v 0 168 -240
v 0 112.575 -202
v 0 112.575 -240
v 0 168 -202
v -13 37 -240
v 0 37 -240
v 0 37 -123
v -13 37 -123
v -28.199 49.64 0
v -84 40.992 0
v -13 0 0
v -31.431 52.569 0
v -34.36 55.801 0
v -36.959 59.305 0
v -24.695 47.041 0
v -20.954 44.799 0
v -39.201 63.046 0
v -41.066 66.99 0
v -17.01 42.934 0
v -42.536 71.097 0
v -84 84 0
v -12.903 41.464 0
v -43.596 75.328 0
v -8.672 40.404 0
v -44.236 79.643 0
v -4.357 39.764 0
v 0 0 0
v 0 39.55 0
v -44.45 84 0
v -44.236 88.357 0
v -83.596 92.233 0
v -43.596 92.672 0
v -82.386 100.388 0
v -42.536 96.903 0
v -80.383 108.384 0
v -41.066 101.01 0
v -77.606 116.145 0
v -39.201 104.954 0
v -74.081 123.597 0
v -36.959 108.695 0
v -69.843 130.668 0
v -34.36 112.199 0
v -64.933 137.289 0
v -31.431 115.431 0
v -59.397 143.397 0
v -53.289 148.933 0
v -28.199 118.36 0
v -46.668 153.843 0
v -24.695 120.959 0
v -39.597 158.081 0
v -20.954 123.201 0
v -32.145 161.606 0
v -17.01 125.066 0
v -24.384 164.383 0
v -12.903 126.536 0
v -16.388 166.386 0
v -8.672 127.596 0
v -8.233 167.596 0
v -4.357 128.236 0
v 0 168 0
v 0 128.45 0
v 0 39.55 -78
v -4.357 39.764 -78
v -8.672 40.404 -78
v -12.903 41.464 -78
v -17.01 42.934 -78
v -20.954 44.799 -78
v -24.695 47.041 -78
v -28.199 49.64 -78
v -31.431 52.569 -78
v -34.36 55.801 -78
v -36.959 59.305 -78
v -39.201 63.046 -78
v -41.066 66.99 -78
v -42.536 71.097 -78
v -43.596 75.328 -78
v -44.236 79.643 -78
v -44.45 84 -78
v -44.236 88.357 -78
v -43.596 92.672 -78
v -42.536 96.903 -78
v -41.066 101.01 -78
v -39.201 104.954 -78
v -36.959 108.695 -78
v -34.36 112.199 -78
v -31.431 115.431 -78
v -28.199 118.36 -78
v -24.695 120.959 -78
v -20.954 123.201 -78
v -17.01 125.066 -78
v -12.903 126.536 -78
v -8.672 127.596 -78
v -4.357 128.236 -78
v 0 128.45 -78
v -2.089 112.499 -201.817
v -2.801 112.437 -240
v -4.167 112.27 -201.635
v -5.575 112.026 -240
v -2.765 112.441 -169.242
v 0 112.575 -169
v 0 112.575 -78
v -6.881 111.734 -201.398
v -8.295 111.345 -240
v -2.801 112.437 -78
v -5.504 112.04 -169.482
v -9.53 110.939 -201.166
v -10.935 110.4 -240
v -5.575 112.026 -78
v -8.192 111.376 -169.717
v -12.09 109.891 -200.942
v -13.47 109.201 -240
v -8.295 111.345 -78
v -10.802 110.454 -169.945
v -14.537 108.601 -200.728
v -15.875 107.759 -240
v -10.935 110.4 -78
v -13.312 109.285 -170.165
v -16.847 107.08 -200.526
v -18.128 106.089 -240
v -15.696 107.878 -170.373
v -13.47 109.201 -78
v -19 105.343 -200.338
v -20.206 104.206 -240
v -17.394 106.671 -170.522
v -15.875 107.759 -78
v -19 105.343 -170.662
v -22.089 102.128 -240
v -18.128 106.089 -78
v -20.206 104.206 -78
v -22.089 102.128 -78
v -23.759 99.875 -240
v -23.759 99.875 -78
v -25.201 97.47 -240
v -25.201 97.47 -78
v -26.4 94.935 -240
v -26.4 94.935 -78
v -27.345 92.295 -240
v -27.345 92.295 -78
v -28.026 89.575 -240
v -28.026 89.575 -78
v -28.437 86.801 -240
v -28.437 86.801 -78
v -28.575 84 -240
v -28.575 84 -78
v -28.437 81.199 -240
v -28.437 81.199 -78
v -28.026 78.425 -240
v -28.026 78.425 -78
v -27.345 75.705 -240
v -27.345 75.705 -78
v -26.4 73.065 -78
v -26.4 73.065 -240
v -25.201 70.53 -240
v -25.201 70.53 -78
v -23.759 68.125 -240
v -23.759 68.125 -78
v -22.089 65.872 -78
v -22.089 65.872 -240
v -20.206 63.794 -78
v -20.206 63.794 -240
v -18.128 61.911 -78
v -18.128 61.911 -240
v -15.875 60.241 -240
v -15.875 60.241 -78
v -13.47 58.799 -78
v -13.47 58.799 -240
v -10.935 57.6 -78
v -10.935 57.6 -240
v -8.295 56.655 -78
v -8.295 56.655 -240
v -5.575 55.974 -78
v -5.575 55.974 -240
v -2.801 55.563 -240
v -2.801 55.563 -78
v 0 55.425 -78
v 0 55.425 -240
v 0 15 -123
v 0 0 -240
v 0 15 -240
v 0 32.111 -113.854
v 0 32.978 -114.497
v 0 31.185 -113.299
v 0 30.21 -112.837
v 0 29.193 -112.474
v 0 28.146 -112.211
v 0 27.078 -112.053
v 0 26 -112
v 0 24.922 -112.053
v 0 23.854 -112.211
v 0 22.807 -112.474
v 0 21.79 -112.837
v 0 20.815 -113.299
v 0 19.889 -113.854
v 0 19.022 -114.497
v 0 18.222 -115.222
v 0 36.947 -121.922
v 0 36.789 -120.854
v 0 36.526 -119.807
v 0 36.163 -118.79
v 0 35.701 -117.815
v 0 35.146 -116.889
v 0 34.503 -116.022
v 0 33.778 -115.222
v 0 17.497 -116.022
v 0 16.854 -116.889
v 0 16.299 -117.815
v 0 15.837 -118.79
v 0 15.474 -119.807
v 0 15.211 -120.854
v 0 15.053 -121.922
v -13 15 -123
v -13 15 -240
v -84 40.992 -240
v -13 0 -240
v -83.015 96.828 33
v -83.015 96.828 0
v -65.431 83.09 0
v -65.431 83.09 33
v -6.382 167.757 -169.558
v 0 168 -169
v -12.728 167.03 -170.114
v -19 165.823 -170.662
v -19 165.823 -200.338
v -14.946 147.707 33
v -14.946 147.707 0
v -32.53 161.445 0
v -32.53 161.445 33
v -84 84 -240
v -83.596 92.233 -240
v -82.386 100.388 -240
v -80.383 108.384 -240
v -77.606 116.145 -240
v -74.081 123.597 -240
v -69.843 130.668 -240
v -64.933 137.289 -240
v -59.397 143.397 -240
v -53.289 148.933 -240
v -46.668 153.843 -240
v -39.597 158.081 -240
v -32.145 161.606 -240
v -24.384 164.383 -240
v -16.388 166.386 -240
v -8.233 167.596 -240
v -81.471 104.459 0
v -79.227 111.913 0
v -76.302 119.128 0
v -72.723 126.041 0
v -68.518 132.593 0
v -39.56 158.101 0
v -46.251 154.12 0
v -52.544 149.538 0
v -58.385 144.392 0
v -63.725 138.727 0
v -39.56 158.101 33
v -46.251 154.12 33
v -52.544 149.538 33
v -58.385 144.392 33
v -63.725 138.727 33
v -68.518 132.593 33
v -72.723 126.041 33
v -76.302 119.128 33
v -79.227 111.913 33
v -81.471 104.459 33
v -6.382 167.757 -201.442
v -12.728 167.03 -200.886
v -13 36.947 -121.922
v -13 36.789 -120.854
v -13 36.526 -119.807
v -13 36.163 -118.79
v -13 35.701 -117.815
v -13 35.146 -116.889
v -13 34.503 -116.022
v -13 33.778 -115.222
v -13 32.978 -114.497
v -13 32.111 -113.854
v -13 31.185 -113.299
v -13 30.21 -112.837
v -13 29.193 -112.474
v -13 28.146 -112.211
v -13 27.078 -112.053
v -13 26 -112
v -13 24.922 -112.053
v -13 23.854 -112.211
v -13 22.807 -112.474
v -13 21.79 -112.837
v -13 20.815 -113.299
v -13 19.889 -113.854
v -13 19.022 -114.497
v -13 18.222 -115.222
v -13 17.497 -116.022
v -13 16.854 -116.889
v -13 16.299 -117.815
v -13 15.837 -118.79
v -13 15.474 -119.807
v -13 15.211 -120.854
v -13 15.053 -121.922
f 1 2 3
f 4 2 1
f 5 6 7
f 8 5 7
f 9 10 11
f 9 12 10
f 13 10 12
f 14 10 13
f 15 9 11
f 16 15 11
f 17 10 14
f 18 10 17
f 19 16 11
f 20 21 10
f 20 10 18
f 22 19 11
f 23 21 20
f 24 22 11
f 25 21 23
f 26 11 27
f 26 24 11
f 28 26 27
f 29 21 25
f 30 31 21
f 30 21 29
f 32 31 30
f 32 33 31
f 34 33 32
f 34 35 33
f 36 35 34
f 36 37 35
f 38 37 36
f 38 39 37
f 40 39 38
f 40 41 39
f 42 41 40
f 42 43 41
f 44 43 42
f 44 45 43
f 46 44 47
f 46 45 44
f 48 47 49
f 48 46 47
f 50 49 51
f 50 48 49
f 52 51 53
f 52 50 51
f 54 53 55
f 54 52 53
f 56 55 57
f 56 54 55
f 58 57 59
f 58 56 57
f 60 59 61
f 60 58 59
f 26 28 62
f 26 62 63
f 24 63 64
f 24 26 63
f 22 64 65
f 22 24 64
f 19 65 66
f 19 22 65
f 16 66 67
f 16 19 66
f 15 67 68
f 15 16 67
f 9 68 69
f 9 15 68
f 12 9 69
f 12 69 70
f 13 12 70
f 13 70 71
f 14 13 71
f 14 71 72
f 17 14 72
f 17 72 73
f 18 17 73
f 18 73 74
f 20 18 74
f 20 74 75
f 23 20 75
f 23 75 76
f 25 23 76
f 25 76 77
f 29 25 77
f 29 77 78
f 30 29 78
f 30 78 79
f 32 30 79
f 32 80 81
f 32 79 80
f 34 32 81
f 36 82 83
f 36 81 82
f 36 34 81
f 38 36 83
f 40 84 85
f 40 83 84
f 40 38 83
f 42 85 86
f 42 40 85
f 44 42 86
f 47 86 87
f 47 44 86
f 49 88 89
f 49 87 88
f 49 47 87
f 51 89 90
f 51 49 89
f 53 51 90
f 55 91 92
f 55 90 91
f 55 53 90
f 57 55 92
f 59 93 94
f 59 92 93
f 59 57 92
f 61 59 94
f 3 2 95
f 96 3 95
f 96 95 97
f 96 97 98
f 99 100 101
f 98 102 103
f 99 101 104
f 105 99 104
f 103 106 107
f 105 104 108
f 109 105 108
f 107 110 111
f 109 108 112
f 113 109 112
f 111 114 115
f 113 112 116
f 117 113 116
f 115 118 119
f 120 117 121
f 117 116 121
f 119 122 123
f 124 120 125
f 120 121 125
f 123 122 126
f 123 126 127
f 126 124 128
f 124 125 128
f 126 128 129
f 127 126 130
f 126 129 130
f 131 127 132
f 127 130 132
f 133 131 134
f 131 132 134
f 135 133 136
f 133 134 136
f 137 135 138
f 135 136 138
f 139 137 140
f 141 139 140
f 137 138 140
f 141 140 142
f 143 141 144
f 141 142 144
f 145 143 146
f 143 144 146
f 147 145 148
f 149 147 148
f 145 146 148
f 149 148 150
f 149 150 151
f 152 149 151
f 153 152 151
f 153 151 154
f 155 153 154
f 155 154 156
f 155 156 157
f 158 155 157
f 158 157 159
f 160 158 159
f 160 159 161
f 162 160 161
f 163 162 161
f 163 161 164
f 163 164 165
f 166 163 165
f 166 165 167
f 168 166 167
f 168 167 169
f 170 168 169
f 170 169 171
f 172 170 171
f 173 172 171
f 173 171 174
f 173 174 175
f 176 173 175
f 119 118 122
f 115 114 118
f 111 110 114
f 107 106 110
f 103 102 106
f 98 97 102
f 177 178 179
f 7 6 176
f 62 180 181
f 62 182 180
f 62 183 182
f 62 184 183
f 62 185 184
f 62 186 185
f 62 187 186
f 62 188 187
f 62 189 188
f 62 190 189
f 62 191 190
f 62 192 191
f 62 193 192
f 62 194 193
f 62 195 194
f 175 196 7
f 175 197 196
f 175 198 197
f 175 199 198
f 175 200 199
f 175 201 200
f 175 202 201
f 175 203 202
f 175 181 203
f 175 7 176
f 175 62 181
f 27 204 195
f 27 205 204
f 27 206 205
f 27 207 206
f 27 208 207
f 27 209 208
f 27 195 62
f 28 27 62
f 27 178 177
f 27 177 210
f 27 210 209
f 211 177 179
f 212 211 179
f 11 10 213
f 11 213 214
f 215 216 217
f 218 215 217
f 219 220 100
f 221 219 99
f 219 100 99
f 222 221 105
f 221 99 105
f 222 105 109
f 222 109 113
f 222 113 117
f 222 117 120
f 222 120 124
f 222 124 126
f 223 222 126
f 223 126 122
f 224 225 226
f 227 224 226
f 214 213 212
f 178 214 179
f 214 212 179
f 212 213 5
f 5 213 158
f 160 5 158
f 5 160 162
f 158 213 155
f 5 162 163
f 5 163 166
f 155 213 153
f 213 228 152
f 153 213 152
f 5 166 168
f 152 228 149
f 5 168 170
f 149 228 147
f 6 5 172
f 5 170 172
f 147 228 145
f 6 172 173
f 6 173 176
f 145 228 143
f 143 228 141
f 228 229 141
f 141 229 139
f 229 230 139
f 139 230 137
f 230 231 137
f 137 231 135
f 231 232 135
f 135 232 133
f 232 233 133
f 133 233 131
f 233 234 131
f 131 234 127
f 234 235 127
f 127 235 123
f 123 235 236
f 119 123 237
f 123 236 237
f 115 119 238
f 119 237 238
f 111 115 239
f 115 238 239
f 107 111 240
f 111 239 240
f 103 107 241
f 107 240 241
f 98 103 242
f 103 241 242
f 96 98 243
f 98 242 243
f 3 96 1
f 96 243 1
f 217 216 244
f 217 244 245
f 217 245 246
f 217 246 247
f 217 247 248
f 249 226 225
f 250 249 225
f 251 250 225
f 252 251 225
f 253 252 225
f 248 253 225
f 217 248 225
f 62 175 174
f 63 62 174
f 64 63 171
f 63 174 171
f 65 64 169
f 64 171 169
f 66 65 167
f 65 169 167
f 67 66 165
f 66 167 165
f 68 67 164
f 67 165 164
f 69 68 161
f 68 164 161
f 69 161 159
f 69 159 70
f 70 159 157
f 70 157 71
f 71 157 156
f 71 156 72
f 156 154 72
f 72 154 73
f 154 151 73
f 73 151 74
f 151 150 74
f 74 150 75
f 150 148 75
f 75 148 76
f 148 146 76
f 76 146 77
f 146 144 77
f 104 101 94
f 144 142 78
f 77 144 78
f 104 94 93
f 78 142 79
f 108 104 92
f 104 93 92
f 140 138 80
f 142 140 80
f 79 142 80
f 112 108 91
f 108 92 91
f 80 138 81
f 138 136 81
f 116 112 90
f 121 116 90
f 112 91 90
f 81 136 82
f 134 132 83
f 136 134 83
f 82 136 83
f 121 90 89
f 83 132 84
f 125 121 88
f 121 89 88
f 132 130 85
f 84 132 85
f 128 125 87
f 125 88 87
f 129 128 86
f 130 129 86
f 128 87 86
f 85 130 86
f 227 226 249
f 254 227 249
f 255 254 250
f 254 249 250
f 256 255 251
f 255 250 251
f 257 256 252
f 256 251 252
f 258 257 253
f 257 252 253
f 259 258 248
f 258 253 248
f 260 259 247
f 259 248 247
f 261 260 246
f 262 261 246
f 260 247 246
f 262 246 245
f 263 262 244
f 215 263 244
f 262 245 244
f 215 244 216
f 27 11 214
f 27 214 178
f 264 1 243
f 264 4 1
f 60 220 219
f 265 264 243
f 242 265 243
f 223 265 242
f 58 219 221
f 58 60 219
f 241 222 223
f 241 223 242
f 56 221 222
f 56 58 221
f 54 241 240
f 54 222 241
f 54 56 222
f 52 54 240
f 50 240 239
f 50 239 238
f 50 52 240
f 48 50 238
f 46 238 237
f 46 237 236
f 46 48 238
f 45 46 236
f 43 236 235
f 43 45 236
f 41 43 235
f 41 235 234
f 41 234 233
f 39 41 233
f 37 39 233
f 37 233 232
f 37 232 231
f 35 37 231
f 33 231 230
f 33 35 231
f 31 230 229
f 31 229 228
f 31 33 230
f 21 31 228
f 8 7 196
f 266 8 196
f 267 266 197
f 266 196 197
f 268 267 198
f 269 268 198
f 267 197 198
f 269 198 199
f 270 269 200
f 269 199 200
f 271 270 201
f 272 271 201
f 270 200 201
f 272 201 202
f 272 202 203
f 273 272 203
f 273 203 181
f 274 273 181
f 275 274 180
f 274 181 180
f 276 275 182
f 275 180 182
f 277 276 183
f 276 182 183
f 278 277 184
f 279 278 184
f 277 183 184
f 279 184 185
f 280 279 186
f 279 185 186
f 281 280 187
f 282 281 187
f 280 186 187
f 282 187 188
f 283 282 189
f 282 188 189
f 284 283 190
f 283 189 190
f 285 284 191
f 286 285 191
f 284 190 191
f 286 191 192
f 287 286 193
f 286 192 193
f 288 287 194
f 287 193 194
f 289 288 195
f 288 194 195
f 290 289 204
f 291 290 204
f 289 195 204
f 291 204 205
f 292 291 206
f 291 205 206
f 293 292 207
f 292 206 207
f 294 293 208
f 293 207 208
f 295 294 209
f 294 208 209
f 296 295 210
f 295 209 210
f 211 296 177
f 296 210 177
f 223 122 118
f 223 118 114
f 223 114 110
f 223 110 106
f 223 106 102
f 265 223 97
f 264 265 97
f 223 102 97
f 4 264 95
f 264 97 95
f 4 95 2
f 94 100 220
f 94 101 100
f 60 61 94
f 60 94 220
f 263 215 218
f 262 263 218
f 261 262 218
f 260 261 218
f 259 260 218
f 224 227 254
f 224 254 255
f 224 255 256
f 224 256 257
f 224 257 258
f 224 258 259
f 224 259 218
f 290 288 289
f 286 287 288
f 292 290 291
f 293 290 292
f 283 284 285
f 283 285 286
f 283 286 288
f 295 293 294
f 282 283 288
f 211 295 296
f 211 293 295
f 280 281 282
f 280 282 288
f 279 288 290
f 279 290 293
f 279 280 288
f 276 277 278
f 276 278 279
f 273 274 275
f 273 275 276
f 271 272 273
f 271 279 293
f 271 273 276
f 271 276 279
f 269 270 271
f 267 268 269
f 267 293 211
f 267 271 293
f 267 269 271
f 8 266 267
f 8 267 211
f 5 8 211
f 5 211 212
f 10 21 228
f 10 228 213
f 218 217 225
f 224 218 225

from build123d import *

# Parameters (mm, degrees)
BOSS_EXTRUDE1_DEPTH = 33
BOSS_EXTRUDE2_DEPTH = 240
BOSS_EXTRUDE3_START = -78
BOSS_EXTRUDE3_DEPTH = 162
CUT_EXTRUDE1_DEPTH  = 13
CUT_EXTRUDE2_START  = -62.656837
CUT_EXTRUDE2_DEPTH  = 62.656837


with BuildPart() as part:
    # Sketch1 → Boss-Extrude1 (new body)
    with BuildSketch(Plane.XY):
        with BuildLine():
            ThreePointArc((-32.530408402, 161.445287327), (-66.192903303, 135.715563927), (-83.014649379, 96.828405531))
            Line((-83.014649379, 96.828405531), (-65.430668922, 83.090294344))
            Line((-65.430668922, 83.090294344), (-14.946427946, 147.707176139))
            Line((-14.946427946, 147.707176139), (-32.530408402, 161.445287327))
        make_face()
    extrude(amount=BOSS_EXTRUDE1_DEPTH)


with BuildPart() as body_2:
    # Sketch1<4> → Boss-Extrude2 (new body)
    with BuildSketch(Plane.XY):
        with BuildLine():
            Line((-13, 0), (0, 0))
            Line((0, 0), (0, 39.55))
            ThreePointArc((0, 39.55), (-44.45, 84), (0, 128.45))
            Line((0, 128.45), (0, 168))
            ThreePointArc((0, 168), (-59.39696962, 143.39696962), (-84, 84))
            Line((-84, 84), (-84, 40.991869112))
            Line((-84, 40.991869112), (-13, 0))
        make_face()
    extrude(amount=-BOSS_EXTRUDE2_DEPTH)

    # Sketch1<5> → Boss-Extrude3 (add)
    with BuildSketch(Plane.XY.offset(BOSS_EXTRUDE3_START)):
        with BuildLine():
            Line((0, 0), (-13, 0))
            Line((-13, 0), (-84, 40.991869112))
            Line((-84, 40.991869112), (-84, 84))
            ThreePointArc((-84, 84), (-59.39696962, 143.39696962), (0, 168))
            Line((0, 168), (0, 112.575))
            ThreePointArc((0, 112.575), (-28.575, 84), (0, 55.425))
            Line((0, 55.425), (0, 0))
        make_face()
    extrude(amount=-BOSS_EXTRUDE3_DEPTH)

    # Sketch2 → Cut-Extrude1 (cut)
    with BuildSketch(Plane(origin=(0, 0, 0), x_dir=(0, 0, -1), z_dir=(1, 0, 0))):
        with BuildLine():
            Line((240, 37), (123, 37))
            ThreePointArc((123, 37), (112, 26), (123, 15))
            Line((123, 15), (240, 15))
            Line((240, 15), (240, 37))
        make_face()
    extrude(amount=-CUT_EXTRUDE1_DEPTH, mode=Mode.SUBTRACT)

    # Sketch3 → Cut-Extrude2 (cut)
    with BuildSketch(Plane(origin=(0, 168, 0), x_dir=(1, 0, 0), z_dir=(0, 1, 0)).offset(CUT_EXTRUDE2_START)):
        Polygon((0, 169), (-19, 170.662284607), (-19, 200.337715393), (0, 202), align=None)
    extrude(amount=CUT_EXTRUDE2_DEPTH, mode=Mode.SUBTRACT)


solid = Compound([part.part, body_2.part])
